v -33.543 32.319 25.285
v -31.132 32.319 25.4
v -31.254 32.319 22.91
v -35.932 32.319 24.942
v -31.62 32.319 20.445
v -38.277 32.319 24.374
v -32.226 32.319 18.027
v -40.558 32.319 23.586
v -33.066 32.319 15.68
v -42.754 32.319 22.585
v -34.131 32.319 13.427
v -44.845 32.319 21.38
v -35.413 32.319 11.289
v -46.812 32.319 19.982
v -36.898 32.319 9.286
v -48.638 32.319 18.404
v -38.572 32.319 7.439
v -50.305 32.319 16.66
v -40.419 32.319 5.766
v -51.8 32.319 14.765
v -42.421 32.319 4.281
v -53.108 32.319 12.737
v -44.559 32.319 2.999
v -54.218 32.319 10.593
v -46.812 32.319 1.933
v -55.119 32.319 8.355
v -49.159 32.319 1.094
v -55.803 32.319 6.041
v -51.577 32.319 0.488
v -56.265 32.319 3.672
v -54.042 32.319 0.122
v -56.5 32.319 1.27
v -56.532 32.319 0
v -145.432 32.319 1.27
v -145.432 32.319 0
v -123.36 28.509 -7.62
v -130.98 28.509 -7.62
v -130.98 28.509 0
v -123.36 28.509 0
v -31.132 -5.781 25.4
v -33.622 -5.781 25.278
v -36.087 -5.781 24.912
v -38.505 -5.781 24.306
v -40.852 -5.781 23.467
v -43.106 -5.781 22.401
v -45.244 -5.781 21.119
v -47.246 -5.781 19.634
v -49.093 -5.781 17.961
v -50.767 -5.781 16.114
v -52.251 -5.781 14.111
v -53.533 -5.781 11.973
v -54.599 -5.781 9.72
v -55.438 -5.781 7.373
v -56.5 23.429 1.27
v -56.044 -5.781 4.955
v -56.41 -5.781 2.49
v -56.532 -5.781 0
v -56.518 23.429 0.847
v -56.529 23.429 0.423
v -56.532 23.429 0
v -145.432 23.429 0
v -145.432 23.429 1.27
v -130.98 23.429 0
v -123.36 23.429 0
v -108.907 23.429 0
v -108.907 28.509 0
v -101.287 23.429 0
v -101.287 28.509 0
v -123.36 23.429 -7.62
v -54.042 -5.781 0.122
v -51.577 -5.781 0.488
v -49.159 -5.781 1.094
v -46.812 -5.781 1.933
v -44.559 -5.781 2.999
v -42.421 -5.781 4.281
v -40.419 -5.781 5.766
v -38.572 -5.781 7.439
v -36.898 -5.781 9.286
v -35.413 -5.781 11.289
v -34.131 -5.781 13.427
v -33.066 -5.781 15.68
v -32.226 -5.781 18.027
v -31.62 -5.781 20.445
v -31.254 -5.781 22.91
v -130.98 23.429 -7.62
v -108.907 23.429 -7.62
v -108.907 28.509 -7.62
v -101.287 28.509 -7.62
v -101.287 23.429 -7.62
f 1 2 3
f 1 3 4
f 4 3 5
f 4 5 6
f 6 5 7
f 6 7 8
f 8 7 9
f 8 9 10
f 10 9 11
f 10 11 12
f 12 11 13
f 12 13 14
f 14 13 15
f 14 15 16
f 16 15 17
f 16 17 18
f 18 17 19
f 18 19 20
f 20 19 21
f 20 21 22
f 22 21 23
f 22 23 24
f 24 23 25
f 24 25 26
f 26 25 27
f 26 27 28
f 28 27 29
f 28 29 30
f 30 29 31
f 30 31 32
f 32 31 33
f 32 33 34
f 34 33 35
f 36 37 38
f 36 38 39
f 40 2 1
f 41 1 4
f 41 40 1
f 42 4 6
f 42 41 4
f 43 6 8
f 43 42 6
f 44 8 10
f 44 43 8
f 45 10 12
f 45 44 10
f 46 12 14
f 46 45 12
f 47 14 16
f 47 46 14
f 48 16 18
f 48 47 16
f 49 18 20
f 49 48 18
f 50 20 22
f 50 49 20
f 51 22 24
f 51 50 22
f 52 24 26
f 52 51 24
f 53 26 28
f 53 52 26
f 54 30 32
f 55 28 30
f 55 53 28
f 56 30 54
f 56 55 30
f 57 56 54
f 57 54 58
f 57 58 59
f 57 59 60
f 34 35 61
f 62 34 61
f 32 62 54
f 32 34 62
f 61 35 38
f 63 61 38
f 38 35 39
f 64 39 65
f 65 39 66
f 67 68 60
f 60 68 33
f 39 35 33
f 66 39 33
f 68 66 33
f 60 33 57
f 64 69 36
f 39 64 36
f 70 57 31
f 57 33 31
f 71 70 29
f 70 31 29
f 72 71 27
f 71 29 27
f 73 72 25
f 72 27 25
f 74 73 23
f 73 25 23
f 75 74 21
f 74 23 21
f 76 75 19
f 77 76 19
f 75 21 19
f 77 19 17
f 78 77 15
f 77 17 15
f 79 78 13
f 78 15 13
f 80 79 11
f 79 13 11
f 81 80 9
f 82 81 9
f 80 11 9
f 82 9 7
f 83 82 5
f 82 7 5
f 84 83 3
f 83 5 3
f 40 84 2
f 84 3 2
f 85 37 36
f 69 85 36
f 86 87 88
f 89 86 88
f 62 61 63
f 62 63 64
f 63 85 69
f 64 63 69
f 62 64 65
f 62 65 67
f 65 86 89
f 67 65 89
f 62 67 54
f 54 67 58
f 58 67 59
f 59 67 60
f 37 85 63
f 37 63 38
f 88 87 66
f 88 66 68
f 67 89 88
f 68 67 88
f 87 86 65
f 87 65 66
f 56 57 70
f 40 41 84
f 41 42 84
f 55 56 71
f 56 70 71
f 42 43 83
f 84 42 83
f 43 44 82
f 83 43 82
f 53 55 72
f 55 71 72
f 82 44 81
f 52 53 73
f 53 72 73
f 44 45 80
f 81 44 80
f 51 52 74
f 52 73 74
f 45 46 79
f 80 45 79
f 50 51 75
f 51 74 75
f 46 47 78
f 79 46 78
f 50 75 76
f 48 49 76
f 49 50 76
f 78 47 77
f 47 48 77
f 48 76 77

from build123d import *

# Parameters (mm, degrees)
F1_DEPTH = 1.27
F0_W     = 7.62
F0_H     = 5.08
F2_DEPTH = 7.62
F3_DEPTH = 1.27
F4_DEPTH = 25.4
F5_R     = 25.39999
F6_R     = 25.39999


# Not quite as in the source:
# - a fillet or chamfer is up to 0.001 mm smaller than in the source, because OpenCascade refuses the exact size


with BuildPart() as f1:
    # F0 (on Top) → F1 (new body)
    with BuildSketch(Plane.XY):
        Polygon((-56.5321096511, 32.319452062), (-145.4321096511, 32.319452062), (-145.4321096511, 23.429452062), (-130.9795096511, 23.429452062), (-130.9795096511, 28.509452062), (-123.3595096511, 28.509452062), (-123.3595096511, 23.429452062), (-108.9069096511, 23.429452062), (-108.9069096511, 28.509452062), (-101.2869096511, 28.509452062), (-101.2869096511, 23.429452062), (-56.5321096511, 23.429452062), align=None)
    extrude(amount=F1_DEPTH)



with BuildPart() as f2:
    # F0 (on Top) → F2 (new body)
    with BuildSketch(Plane.XY):
        with Locations((-127.1695096511, 25.969452062)):
            Rectangle(F0_W, F0_H)
    extrude(amount=-F2_DEPTH)


with BuildPart() as f2b:
    # F0 (on Top) → F2, piece 2 (new body)
    with BuildSketch(Plane.XY):
        with Locations((-105.0969096511, 25.969452062)):
            Rectangle(F0_W, F0_H)
    extrude(amount=-F2_DEPTH)


with BuildPart() as f1_1:
    add(f1.part)

    add(f2.part)  # F3 merges F2

    add(f2b.part)  # F3 merges F2b
    # F0 (on Top) → F3 (join)
    with BuildSketch(Plane.XY):
        with Locations((-127.1695096511, 25.969452062)):
            Rectangle(F0_W, F0_H)
        with Locations((-105.0969096511, 25.969452062)):
            Rectangle(F0_W, F0_H)
    extrude(amount=F3_DEPTH)

    # F0 (on Top) → F4 (join)
    with BuildSketch(Plane.XY):
        Polygon((-31.1321096511, 32.319452062), (-56.5321096511, 32.319452062), (-56.5321096511, 23.429452062), (-56.5321096511, -5.780547938), (-31.1321096511, -5.780547938), align=None)
    extrude(amount=F4_DEPTH)

    # F5 (radius 25.4 in the source; OpenCascade refuses exactly that, so slightly less here)
    f5_edges = [f1_1.edges().sort_by_distance(p)[0] for p in [
        (-31.13211, 13.269452, 0),
    ]]
    fillet(f5_edges, radius=F5_R)

    # F6 (radius 25.4 in the source; OpenCascade refuses exactly that, so slightly less here)
    f6_edges = [f1_1.edges().sort_by_distance(p)[0] for p in [
        (-56.53211, 13.269452, 25.4),
    ]]
    fillet(f6_edges, radius=F6_R)


solid = f1_1.part
